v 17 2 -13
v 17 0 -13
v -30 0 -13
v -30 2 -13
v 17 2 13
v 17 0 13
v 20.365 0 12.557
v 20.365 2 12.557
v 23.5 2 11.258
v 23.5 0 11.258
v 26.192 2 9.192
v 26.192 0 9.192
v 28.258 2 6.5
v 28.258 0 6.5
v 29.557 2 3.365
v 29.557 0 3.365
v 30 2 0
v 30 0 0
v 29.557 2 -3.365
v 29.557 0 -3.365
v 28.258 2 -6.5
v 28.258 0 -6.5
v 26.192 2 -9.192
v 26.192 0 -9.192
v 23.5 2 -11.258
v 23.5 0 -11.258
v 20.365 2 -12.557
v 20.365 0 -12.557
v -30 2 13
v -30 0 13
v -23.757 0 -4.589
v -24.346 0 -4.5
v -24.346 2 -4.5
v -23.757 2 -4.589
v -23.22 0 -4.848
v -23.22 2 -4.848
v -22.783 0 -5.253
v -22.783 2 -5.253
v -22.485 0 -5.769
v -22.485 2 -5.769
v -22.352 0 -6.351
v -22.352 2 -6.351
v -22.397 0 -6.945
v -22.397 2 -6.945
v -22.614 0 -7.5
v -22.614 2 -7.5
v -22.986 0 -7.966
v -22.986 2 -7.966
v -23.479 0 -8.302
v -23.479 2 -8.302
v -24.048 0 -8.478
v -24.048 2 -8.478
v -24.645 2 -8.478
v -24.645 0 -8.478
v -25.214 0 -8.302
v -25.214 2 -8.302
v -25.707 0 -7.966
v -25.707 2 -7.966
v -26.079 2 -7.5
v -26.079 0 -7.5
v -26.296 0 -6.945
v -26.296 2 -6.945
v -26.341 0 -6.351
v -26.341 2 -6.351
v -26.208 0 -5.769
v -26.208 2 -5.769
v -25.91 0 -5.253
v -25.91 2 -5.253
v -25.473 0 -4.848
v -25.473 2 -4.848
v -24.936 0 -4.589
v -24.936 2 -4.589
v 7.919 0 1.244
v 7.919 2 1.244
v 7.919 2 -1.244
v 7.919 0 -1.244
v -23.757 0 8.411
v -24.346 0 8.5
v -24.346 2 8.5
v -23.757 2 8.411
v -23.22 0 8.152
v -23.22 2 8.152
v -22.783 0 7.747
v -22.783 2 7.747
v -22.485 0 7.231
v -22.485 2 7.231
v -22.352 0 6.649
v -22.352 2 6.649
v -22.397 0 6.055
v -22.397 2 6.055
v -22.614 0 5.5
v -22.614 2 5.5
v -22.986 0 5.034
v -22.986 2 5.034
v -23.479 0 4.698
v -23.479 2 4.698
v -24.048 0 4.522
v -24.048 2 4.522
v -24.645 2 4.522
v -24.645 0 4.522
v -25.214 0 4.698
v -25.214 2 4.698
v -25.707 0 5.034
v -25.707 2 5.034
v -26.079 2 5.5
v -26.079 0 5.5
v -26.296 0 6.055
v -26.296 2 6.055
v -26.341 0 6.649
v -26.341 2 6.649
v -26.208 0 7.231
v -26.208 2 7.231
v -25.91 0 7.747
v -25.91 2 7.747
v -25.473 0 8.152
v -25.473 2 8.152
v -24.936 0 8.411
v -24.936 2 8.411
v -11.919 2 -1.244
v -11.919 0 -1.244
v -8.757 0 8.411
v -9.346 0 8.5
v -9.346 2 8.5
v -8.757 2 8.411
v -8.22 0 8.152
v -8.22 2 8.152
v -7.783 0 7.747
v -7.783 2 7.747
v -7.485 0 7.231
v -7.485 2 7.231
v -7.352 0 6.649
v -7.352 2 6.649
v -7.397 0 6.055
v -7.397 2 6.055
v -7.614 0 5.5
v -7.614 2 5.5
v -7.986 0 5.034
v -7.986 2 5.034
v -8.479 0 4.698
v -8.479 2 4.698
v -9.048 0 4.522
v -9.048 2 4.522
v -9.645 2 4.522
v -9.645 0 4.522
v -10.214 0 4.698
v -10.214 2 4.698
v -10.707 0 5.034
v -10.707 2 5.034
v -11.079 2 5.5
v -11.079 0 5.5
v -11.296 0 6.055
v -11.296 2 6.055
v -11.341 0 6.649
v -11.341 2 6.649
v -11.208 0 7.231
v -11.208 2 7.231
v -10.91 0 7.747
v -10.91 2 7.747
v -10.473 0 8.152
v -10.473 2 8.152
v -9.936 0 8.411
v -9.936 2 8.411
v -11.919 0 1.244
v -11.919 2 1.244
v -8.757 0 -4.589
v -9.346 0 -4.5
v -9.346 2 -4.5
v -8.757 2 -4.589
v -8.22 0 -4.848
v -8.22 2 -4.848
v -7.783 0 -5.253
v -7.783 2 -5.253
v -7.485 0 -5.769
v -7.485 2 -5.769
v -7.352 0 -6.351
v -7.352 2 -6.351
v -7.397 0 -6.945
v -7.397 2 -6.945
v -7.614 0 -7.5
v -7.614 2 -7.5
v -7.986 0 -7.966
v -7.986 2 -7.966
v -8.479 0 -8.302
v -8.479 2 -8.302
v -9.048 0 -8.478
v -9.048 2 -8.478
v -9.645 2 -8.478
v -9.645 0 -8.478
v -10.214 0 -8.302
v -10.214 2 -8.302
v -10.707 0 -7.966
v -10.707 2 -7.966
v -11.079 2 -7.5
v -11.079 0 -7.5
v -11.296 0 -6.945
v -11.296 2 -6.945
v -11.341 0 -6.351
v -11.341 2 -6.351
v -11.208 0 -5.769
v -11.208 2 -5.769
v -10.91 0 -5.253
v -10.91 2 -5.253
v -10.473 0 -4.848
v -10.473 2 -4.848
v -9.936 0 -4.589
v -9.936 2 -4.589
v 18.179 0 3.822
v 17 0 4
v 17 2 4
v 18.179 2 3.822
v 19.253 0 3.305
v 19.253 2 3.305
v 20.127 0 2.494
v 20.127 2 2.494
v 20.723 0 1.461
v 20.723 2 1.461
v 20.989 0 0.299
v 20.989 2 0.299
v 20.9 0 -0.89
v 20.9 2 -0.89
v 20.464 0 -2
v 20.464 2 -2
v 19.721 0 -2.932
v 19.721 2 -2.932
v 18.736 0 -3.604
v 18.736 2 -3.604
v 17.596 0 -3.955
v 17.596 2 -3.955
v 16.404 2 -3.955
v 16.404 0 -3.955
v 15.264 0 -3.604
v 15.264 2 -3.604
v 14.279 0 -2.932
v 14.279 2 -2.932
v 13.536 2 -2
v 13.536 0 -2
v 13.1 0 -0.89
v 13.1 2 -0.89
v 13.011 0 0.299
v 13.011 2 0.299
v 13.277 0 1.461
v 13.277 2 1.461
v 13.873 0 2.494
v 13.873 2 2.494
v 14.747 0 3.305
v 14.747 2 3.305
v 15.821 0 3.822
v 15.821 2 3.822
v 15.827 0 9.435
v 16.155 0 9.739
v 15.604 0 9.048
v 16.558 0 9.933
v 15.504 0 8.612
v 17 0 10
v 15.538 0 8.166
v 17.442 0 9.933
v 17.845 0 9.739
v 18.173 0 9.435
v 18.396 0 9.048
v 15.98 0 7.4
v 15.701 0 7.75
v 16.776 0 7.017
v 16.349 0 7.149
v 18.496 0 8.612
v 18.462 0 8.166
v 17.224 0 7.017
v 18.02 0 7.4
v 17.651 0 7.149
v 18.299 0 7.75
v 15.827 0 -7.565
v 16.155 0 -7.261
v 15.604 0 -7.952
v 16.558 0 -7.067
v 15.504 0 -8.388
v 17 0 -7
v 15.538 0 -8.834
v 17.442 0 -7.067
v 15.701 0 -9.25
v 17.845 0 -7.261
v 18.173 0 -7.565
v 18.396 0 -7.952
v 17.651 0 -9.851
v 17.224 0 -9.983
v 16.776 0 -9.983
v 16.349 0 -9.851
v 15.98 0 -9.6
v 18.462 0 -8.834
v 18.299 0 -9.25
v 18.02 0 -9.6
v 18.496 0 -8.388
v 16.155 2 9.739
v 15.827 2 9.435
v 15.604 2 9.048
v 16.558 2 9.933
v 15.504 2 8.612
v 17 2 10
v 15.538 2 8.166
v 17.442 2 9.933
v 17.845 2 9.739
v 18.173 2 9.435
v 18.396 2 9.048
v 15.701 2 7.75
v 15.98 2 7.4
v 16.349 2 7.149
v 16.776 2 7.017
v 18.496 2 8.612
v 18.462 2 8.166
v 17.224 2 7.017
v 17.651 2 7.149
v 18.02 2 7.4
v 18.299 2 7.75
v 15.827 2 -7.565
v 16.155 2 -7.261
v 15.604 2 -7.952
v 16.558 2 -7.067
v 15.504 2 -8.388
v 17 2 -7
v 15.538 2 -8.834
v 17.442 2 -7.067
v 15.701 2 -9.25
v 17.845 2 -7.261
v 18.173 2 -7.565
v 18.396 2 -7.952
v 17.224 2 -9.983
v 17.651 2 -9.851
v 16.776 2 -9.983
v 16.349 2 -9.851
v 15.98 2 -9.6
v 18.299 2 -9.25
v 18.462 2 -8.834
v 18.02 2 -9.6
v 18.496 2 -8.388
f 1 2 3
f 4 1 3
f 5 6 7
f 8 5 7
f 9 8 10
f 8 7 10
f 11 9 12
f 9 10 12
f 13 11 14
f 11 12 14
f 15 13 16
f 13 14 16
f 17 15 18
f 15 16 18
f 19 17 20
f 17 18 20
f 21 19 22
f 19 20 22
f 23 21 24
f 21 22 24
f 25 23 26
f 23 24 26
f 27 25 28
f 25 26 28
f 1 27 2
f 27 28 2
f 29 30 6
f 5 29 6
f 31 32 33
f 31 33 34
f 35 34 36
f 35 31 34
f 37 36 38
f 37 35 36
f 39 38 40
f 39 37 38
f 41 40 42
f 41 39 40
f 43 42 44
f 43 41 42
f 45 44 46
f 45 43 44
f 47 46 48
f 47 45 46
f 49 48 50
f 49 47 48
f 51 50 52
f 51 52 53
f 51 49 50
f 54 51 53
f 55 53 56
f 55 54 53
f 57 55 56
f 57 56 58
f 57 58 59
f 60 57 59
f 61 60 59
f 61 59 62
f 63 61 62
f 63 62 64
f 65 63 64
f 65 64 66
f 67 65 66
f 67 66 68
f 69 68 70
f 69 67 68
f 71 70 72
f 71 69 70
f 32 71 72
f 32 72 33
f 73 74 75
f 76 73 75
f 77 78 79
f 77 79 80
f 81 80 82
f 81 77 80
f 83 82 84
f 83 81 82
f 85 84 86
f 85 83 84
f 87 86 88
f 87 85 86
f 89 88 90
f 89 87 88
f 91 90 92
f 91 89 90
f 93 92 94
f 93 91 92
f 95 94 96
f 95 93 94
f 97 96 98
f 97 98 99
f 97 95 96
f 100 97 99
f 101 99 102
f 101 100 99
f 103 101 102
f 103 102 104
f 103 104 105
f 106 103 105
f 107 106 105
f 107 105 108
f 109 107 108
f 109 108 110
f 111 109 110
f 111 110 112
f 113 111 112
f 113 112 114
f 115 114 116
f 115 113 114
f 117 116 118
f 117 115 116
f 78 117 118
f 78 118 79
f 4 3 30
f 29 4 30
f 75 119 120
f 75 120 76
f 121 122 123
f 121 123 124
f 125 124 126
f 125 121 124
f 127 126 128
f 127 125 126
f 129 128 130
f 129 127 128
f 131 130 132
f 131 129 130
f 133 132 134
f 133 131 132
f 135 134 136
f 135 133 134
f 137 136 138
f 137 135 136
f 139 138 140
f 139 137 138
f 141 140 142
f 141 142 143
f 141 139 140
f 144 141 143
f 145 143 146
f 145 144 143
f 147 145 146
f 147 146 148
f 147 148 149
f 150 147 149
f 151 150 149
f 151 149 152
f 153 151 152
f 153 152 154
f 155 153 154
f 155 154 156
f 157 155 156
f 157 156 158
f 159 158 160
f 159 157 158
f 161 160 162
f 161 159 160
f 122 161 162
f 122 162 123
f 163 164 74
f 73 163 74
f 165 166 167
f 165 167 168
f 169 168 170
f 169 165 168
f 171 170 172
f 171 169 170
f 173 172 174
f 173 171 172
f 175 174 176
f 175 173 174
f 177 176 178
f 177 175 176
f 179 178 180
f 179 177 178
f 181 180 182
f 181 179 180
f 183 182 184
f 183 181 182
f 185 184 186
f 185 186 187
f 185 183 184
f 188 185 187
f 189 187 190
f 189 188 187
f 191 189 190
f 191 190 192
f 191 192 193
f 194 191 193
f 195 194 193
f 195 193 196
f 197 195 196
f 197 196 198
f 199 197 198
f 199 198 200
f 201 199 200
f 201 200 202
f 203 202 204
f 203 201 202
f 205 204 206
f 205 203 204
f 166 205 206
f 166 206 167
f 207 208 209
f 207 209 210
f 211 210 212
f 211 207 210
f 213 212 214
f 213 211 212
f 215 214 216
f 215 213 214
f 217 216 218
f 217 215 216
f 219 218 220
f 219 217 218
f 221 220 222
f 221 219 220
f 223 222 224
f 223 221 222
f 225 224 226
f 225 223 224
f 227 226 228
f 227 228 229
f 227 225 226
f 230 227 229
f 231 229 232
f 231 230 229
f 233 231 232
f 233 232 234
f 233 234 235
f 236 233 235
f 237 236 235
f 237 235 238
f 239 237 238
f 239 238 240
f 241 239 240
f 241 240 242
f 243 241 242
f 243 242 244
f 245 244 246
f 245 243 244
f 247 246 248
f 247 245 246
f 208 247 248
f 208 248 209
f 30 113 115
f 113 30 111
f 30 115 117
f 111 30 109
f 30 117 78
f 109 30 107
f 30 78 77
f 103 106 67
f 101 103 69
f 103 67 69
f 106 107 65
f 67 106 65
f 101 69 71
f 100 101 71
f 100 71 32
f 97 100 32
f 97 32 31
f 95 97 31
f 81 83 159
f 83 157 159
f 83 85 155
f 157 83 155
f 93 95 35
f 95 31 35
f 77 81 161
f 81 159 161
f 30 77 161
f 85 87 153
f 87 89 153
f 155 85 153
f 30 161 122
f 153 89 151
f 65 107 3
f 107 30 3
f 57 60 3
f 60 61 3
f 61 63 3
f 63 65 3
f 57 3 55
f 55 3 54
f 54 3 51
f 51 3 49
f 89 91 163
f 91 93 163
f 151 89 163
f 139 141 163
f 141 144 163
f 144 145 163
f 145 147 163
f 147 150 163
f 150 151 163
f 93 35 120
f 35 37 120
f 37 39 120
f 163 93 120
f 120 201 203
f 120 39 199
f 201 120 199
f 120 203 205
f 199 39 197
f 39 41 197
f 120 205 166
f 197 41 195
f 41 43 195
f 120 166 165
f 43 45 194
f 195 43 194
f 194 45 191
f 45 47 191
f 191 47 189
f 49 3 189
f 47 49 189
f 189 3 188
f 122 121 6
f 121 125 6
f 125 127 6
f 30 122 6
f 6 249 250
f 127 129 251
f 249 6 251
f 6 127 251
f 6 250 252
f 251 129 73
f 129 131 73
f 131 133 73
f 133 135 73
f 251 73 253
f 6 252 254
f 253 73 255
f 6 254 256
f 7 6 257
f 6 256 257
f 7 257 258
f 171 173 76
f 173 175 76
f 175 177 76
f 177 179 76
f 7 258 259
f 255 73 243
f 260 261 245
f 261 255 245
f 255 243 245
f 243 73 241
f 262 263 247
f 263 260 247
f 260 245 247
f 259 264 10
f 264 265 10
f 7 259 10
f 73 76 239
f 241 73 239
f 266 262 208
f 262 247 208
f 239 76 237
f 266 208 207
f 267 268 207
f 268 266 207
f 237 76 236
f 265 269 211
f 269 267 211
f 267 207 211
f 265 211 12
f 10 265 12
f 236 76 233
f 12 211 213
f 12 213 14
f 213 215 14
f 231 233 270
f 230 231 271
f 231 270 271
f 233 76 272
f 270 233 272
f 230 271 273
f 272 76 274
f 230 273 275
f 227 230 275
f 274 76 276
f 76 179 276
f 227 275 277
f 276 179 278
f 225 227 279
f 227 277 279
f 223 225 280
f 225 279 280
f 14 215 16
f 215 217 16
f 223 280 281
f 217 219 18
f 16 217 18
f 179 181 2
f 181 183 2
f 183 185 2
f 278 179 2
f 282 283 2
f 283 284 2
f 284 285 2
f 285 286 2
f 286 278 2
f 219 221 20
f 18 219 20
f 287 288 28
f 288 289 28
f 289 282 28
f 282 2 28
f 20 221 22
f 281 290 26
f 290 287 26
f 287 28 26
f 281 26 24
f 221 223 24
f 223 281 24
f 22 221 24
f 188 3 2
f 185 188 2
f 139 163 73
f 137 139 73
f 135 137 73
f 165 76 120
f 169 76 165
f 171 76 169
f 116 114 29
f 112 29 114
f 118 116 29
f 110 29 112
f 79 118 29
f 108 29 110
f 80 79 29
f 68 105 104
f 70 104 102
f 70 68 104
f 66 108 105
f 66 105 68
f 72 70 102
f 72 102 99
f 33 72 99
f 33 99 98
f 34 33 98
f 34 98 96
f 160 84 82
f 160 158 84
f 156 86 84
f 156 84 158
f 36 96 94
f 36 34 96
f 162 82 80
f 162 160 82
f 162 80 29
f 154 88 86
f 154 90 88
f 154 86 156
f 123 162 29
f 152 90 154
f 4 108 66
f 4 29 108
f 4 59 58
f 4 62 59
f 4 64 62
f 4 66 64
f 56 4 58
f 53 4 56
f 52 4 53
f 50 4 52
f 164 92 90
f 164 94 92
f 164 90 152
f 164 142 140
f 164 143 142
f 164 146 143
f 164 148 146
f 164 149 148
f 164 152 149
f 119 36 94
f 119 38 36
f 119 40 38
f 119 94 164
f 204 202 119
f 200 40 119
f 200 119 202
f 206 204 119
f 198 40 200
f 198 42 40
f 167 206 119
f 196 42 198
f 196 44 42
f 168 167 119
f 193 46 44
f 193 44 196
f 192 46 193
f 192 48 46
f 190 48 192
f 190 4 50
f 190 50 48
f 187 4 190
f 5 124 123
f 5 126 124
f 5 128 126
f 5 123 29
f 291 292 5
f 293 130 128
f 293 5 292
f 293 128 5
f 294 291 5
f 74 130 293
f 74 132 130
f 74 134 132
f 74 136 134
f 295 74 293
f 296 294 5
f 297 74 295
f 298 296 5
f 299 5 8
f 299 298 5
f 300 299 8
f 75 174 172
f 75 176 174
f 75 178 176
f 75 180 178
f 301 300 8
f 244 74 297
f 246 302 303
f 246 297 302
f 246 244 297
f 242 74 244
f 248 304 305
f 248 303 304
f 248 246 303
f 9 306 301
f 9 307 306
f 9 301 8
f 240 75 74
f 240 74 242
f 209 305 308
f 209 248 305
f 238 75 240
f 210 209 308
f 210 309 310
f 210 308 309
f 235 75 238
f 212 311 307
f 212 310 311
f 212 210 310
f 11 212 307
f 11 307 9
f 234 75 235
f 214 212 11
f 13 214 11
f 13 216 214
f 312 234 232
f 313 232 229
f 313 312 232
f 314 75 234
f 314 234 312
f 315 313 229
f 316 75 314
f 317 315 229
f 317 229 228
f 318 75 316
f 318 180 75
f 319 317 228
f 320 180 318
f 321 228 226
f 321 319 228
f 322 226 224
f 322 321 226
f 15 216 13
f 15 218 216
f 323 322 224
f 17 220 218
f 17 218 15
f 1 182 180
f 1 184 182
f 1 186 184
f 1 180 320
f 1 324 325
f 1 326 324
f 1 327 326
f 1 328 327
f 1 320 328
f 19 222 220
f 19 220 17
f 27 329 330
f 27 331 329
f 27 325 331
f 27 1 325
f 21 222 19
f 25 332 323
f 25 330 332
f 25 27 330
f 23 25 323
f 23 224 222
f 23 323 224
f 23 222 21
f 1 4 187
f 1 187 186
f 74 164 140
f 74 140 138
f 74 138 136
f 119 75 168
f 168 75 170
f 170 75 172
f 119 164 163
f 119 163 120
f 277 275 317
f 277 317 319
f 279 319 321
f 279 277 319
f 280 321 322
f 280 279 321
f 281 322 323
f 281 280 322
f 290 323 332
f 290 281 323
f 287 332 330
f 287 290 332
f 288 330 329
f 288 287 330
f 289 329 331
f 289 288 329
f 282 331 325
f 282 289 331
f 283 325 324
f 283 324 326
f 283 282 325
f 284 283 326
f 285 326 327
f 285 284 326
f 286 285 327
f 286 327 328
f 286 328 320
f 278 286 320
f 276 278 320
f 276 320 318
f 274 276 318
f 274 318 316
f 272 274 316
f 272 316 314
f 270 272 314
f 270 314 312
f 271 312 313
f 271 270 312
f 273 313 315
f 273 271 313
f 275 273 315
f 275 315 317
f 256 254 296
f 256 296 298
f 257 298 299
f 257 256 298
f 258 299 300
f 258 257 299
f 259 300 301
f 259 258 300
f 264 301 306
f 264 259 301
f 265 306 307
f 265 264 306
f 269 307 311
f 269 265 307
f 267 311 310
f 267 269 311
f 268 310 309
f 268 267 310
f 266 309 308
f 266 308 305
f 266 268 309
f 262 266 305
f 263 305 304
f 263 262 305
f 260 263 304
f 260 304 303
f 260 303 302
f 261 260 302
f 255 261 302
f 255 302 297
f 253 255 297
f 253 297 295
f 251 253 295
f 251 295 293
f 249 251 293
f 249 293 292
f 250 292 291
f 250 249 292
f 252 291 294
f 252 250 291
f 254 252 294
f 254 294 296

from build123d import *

# Parameters (mm, degrees)
SKETCH3_R           = 2
SKETCH3_R_2         = 1.5
SKETCH3_R_3         = 4
BOSS_EXTRUDE1_DEPTH = 2
SKETCH6_W           = 19.838520206
SKETCH6_H           = 2.488043404
CUT_EXTRUDE1_DEPTH  = 50


with BuildPart() as part:
    # Sketch3 → Boss-Extrude1 (new body)
    with BuildSketch(Plane(origin=(0, 0, 0), x_dir=(1, 0, 0), z_dir=(0, 1, 0))):
        with BuildLine():
            Line((17, 13), (-30, 13))
            Line((-30, 13), (-30, -13))
            Line((-30, -13), (17, -13))
            ThreePointArc((17, -13), (30, 0), (17, 13))
        make_face()
        with Locations(Location((-24.346479472, -6.5, 0), (0, 0, 270))):
            Circle(SKETCH3_R, mode=Mode.SUBTRACT)
        with Locations(Location((-9.346479472, -6.5, 0), (0, 0, 270))):
            Circle(SKETCH3_R, mode=Mode.SUBTRACT)
        with Locations(Location((-9.346479472, 6.5, 0), (0, 0, 270))):
            Circle(SKETCH3_R, mode=Mode.SUBTRACT)
        with Locations(Location((-24.346479472, 6.5, 0), (0, 0, 270))):
            Circle(SKETCH3_R, mode=Mode.SUBTRACT)
        with Locations(Location((17, -8.5, 0), (0, 0, 270))):
            Circle(SKETCH3_R_2, mode=Mode.SUBTRACT)
        with Locations(Location((17, 8.5, 0), (0, 0, 270))):
            Circle(SKETCH3_R_2, mode=Mode.SUBTRACT)
        with Locations(Location((17, 0, 0), (0, 0, 270))):
            Circle(SKETCH3_R_3, mode=Mode.SUBTRACT)
    extrude(amount=BOSS_EXTRUDE1_DEPTH)

    # Sketch6 → Cut-Extrude1 (cut)
    with BuildSketch(Plane(origin=(0, 2, 0), x_dir=(1, 0, 0), z_dir=(0, 1, 0))):
        with Locations((-2, 0)):
            Rectangle(SKETCH6_W, SKETCH6_H)
    extrude(amount=-CUT_EXTRUDE1_DEPTH, mode=Mode.SUBTRACT)


solid = part.part
